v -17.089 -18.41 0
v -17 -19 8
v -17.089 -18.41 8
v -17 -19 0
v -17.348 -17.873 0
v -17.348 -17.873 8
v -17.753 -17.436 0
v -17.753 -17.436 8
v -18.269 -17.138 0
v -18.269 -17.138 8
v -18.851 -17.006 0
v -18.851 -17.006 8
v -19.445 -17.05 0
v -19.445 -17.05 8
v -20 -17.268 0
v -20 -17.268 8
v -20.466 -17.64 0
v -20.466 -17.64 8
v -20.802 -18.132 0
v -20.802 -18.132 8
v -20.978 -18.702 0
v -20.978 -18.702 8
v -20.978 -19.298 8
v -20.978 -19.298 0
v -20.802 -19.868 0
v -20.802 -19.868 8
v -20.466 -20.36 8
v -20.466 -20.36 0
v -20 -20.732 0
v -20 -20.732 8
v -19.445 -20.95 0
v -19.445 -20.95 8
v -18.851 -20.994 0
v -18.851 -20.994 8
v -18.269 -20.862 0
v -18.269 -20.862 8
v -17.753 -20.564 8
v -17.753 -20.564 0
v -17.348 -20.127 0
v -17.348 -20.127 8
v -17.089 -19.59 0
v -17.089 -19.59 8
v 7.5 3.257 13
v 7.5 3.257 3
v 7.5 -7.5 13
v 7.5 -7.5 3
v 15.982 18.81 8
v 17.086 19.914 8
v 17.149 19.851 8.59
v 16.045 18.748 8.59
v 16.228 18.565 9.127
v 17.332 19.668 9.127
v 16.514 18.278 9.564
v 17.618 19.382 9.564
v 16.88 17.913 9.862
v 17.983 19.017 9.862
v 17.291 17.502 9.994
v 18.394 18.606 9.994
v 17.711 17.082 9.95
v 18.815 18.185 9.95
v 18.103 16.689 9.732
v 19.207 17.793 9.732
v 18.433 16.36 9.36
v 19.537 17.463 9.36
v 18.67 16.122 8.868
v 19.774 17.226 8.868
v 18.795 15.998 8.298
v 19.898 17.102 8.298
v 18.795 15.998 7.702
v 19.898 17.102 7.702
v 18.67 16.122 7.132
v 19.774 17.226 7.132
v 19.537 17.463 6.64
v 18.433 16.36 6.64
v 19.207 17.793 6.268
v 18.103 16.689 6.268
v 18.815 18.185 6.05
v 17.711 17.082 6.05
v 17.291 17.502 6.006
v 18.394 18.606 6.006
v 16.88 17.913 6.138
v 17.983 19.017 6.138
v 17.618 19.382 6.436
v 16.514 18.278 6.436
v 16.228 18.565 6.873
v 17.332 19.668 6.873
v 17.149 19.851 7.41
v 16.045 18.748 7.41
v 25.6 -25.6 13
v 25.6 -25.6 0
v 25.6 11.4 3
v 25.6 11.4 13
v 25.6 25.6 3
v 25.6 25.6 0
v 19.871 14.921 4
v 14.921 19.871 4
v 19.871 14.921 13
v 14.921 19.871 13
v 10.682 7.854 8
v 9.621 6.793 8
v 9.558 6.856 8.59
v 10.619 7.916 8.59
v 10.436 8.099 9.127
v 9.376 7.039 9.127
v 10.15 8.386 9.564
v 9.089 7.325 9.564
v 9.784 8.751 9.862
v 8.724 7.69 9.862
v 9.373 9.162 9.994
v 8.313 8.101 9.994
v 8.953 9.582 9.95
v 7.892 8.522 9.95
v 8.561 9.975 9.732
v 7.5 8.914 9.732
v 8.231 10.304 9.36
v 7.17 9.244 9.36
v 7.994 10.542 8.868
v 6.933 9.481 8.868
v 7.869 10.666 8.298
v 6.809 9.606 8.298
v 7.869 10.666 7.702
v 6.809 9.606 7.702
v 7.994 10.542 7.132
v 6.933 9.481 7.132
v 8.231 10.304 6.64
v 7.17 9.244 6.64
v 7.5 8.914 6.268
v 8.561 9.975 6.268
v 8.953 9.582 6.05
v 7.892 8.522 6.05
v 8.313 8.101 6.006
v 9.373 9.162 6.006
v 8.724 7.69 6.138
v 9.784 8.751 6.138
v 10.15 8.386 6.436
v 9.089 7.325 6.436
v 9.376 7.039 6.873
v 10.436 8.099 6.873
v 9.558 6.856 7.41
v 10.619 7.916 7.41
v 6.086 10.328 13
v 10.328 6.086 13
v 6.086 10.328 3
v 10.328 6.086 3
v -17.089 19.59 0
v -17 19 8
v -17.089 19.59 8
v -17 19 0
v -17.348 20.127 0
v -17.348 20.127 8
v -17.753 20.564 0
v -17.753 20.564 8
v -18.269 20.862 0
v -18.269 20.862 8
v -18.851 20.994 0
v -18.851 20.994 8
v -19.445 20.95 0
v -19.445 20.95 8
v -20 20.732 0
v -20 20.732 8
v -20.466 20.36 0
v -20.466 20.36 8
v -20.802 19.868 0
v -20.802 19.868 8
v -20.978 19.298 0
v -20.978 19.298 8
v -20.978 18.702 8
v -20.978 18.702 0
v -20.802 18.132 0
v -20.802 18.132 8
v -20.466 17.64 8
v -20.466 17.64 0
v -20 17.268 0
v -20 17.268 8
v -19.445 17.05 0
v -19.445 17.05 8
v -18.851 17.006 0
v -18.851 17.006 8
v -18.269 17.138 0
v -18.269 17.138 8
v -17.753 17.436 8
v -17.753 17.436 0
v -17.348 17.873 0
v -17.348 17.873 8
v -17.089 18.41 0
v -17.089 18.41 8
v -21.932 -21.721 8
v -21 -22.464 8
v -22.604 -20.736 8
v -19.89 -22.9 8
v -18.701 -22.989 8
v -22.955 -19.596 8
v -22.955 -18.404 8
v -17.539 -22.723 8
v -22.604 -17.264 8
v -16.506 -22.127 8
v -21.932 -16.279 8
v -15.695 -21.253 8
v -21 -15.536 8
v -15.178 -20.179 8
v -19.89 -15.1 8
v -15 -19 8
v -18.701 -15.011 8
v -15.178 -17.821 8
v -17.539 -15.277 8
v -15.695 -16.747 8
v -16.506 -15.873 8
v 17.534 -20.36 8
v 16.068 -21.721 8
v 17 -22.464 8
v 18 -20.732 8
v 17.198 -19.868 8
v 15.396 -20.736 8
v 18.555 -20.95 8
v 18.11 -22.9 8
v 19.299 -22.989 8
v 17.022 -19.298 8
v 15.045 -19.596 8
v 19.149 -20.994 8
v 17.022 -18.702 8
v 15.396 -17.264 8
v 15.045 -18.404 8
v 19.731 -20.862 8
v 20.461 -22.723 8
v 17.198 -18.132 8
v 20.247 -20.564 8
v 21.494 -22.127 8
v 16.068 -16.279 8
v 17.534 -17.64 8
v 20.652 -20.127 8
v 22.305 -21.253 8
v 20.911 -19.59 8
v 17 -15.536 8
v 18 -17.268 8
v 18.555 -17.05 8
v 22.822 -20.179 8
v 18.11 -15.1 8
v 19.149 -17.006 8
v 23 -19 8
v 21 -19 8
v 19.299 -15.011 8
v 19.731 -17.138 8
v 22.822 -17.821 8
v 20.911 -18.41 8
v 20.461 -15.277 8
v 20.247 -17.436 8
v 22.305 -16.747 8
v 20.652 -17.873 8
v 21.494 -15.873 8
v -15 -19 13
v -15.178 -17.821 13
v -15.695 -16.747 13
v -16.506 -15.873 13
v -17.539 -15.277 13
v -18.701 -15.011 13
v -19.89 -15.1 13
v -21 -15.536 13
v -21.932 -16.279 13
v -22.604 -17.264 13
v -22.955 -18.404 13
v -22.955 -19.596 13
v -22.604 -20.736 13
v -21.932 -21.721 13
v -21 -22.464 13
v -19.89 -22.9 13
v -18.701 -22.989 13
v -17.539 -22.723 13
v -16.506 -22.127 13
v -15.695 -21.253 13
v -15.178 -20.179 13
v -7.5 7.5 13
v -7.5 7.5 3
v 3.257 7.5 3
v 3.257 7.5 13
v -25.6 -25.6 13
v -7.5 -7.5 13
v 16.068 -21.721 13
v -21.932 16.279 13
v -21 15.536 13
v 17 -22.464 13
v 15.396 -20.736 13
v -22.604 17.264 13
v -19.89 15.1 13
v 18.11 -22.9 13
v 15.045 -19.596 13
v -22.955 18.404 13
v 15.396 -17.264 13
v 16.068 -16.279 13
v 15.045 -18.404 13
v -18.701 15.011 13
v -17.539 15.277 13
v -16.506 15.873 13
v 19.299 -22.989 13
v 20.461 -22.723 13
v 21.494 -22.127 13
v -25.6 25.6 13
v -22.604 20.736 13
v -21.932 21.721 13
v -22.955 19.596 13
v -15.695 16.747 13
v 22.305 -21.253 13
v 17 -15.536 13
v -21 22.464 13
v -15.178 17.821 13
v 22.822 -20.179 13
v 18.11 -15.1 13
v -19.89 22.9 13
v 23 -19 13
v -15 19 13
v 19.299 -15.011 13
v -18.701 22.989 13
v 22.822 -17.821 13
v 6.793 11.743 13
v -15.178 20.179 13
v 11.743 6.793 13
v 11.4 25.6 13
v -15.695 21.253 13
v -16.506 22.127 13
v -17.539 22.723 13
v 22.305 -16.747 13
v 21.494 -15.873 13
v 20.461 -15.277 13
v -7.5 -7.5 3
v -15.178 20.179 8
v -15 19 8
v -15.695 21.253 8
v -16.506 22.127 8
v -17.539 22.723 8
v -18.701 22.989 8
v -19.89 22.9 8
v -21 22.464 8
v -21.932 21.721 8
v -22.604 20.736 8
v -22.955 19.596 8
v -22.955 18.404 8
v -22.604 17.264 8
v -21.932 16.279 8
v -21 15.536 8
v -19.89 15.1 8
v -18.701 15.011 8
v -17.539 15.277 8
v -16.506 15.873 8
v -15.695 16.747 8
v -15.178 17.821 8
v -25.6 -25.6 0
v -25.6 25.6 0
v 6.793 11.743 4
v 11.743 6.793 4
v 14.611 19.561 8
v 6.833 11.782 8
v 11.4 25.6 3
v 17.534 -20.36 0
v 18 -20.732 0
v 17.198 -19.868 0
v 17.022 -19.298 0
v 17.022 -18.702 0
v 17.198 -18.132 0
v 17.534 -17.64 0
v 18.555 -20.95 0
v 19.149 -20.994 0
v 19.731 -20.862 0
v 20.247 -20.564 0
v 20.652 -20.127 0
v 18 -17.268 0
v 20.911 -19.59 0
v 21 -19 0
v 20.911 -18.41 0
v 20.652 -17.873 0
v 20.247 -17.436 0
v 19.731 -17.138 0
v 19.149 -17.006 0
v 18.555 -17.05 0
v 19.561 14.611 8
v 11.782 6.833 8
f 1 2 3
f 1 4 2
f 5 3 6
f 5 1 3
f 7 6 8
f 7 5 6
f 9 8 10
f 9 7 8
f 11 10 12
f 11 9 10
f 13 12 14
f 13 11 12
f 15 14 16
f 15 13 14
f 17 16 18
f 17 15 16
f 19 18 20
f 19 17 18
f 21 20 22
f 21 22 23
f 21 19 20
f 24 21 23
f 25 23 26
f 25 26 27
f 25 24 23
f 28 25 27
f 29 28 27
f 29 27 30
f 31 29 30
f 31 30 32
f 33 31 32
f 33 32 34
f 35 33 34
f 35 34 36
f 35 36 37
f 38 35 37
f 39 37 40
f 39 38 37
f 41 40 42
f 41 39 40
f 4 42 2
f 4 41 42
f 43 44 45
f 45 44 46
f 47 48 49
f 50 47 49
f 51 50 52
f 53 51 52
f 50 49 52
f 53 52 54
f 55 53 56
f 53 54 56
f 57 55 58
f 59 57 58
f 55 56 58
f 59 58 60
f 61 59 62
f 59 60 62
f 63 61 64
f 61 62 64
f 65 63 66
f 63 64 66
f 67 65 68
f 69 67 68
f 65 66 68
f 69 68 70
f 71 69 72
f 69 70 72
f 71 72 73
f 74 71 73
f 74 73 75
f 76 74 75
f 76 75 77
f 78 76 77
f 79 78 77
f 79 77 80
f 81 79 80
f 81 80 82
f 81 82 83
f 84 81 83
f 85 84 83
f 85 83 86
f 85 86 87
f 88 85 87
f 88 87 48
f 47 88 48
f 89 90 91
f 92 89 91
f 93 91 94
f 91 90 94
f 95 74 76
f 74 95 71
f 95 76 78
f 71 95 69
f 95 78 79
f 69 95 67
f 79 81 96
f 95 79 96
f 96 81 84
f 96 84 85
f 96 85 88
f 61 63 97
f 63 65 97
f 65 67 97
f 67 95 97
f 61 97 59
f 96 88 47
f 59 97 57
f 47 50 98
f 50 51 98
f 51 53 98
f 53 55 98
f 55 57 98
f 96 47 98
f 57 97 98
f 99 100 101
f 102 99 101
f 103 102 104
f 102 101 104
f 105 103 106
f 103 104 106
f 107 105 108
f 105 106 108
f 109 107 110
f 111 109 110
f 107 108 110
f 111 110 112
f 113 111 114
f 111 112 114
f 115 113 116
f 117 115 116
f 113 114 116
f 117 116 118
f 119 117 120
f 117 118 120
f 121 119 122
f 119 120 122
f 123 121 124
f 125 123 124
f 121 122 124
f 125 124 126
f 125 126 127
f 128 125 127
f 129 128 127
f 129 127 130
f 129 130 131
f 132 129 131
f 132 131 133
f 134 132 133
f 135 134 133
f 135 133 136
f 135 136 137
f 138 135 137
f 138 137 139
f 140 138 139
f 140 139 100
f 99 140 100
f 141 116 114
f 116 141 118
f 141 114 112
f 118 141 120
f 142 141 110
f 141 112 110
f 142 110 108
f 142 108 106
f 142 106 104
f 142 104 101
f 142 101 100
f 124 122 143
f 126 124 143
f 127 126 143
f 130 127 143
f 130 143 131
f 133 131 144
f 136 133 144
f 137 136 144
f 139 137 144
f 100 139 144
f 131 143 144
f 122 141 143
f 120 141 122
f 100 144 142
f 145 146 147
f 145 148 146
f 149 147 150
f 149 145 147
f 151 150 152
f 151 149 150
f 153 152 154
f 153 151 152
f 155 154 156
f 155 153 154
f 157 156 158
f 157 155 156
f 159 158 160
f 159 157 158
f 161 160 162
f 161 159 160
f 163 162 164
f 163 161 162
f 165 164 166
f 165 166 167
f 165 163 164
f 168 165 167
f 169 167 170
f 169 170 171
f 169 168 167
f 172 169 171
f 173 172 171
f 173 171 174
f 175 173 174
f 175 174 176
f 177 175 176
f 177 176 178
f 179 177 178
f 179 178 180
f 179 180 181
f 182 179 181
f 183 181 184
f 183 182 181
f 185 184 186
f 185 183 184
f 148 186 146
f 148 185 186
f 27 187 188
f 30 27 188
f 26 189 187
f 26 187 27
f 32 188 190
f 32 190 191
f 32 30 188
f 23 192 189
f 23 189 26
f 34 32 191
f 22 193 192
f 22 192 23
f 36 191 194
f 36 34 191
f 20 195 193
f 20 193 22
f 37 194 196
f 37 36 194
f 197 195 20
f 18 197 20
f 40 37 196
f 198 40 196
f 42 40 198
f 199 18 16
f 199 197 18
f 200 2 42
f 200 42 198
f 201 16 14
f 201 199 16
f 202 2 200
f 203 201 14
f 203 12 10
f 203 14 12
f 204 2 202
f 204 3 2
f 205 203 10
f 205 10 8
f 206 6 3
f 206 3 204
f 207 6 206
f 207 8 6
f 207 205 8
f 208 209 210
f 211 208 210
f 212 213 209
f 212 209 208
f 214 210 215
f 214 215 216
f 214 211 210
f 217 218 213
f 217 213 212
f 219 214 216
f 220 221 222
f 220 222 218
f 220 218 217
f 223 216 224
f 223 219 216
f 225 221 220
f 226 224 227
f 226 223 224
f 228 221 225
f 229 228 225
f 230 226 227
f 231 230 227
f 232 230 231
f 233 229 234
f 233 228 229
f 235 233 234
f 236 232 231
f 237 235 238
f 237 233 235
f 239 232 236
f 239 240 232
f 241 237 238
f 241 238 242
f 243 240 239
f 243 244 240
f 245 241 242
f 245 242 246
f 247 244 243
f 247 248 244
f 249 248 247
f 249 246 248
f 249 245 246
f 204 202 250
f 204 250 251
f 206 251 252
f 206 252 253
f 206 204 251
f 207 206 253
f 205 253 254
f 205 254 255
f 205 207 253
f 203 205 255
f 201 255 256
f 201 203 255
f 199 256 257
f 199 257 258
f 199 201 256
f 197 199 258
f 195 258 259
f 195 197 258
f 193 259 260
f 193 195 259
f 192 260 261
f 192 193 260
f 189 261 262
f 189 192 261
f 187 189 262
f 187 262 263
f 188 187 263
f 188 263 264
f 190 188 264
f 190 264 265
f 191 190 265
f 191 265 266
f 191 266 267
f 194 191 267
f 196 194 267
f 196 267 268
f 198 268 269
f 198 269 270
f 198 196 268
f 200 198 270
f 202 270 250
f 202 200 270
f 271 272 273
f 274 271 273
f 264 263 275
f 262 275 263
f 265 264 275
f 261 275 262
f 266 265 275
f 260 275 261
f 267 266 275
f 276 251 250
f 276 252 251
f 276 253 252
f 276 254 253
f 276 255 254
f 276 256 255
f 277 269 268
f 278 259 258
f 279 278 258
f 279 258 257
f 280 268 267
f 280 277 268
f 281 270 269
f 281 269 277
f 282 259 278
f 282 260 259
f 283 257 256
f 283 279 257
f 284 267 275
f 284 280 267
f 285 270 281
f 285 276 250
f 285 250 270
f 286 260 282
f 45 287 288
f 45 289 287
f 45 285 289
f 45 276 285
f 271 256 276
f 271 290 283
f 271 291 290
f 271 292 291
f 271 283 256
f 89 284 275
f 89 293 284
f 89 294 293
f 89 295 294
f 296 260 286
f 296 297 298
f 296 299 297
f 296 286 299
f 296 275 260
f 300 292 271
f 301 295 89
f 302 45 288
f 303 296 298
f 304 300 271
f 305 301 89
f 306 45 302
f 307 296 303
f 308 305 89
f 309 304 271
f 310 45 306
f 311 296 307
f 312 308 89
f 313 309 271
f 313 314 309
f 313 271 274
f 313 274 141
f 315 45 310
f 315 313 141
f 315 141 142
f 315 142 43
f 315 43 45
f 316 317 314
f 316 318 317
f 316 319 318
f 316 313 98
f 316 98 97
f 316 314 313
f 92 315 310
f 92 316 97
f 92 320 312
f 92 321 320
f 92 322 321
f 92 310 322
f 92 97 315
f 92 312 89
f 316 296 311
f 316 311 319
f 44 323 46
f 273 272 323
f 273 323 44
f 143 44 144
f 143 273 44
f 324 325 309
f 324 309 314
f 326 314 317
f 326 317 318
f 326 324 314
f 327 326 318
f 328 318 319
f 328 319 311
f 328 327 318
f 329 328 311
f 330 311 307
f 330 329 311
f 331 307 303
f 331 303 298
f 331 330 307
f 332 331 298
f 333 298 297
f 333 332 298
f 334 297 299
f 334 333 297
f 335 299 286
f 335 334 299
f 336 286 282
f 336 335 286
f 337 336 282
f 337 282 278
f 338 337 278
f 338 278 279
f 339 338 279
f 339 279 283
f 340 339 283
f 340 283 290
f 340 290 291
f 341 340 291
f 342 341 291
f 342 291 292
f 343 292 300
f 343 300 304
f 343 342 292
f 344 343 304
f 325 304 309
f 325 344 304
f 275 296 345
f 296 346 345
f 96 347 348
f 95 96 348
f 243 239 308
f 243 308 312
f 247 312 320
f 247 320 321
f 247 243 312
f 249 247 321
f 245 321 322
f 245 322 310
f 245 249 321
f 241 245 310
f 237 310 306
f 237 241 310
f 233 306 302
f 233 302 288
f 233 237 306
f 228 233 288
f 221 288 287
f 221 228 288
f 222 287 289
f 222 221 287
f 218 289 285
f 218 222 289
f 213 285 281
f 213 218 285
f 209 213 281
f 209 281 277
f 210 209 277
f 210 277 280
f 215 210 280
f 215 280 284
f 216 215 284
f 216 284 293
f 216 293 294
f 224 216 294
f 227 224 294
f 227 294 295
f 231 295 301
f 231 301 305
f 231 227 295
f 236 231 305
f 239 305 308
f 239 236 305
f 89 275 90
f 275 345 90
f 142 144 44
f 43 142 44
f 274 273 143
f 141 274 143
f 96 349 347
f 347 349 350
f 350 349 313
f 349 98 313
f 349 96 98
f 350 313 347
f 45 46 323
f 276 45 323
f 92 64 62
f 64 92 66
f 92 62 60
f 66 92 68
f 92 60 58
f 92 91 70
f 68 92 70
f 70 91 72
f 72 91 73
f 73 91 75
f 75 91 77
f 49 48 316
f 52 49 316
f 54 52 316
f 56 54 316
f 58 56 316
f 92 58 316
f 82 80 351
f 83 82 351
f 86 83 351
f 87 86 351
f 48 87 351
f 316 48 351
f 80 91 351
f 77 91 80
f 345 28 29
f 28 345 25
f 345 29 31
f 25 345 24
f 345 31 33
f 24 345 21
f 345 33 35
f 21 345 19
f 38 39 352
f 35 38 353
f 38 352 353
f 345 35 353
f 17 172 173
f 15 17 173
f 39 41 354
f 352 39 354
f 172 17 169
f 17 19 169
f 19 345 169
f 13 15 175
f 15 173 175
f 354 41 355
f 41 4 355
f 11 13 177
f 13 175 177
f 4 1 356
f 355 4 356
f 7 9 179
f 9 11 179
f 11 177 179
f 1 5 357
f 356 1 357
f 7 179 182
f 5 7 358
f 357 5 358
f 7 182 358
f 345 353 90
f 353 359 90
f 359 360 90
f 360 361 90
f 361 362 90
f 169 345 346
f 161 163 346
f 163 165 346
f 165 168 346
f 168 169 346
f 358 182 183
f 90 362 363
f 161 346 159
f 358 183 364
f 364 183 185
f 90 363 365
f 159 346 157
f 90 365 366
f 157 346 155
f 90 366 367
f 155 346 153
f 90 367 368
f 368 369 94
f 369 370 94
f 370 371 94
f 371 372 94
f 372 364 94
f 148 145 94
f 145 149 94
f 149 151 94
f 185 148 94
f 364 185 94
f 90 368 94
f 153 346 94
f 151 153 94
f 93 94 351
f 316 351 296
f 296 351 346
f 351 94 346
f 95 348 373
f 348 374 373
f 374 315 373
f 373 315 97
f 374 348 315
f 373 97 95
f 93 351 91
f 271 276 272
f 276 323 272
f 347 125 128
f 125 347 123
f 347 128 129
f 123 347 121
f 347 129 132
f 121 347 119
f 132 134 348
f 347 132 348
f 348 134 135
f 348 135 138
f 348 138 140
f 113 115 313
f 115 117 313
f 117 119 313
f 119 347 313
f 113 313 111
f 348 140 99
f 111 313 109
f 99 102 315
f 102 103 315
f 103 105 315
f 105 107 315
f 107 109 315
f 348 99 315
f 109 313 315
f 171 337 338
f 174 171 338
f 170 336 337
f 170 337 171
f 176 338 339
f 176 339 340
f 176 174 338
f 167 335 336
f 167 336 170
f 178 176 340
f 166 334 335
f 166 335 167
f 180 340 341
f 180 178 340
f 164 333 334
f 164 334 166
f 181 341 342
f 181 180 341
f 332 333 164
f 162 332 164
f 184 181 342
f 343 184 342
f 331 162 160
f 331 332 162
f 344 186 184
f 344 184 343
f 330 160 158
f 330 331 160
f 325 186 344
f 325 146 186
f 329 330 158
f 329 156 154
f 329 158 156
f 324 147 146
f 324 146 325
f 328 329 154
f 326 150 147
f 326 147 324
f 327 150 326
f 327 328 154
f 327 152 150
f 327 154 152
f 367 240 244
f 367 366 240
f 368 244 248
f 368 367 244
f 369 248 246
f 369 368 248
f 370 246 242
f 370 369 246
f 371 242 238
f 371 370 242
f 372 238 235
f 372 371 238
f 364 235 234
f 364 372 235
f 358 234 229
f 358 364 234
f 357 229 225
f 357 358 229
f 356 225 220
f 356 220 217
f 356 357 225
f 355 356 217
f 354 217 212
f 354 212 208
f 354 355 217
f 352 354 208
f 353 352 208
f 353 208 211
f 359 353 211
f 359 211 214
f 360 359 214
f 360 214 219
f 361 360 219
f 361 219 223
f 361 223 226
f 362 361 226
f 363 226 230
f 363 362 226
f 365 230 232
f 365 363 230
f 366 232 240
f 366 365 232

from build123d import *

# Parameters (mm, degrees)
F0_W      = 51.2
F0_H      = 51.2
F0_R      = 2
F1_DEPTH  = 3
F2_R      = 2
F3_DEPTH  = 5
F4_R      = 4
F5_DEPTH  = 5
F6_R      = 2
F7_DEPTH  = 2
F8_R      = 3.5
F9_DEPTH  = 11
F10_R     = 2
F11_DEPTH = 4
F13_DEPTH = 9


with BuildPart() as f1:
    # F0 (on Top) → F1 (new body)
    with BuildSketch(Plane.XY):
        Rectangle(F0_W, F0_H)
        with Locations((-19, -19)):
            Circle(F0_R, mode=Mode.SUBTRACT)
        with Locations((19, -19)):
            Circle(F0_R, mode=Mode.SUBTRACT)
        with Locations((-19, 19)):
            Circle(F0_R, mode=Mode.SUBTRACT)
    extrude(amount=F1_DEPTH)

    # F2 (on face) → F3 (join)
    with BuildSketch(Plane.XY.offset(3)):
        Polygon((11.4, 25.6), (-25.6, 25.6), (-25.6, -25.6), (25.6, -25.6), (25.6, 11.4), align=None)
        with Locations((-19, -19)):
            Circle(F2_R, mode=Mode.SUBTRACT)
        with Locations((19, -19)):
            Circle(F2_R, mode=Mode.SUBTRACT)
        with Locations((-19, 19)):
            Circle(F2_R, mode=Mode.SUBTRACT)
        Polygon((-7.5, -7.5), (-7.5, 7.5), (3.2573593129, 7.5), (6.0857864376, 10.3284271247), (10.3284271247, 6.0857864376), (7.5, 3.2573593129), (7.5, -7.5), align=None, mode=Mode.SUBTRACT)
    extrude(amount=F3_DEPTH)

    # F4 (on face) → F5 (join)
    with BuildSketch(Plane.XY.offset(8)):
        Polygon((11.4, 25.6), (-25.6, 25.6), (-25.6, -25.6), (25.6, -25.6), (25.6, 11.4), align=None)
        with Locations((-19, -19)):
            Circle(F4_R, mode=Mode.SUBTRACT)
        with Locations((19, -19)):
            Circle(F4_R, mode=Mode.SUBTRACT)
        with Locations((-19, 19)):
            Circle(F4_R, mode=Mode.SUBTRACT)
        Polygon((-7.5, -7.5), (-7.5, 7.5), (3.2573593129, 7.5), (6.0857864376, 10.3284271247), (10.3284271247, 6.0857864376), (7.5, 3.2573593129), (7.5, -7.5), align=None, mode=Mode.SUBTRACT)
    extrude(amount=F5_DEPTH)

    # F6 (on face) → F7 (cut)
    with BuildSketch(Plane(origin=(18.5, 18.5, 0), x_dir=(-0.7071067812, 0.7071067812, 0), z_dir=(0.7071067812, 0.7071067812, 0))):
        with Locations((0, 8)):
            Circle(F6_R)
    extrude(amount=-F7_DEPTH, mode=Mode.SUBTRACT)

    # F8 (on face) → F9 (cut)
    with BuildSketch(Plane(origin=(17.0857864376, 17.0857864376, 0), x_dir=(-0.7071067812, 0.7071067812, 0), z_dir=(0.7071067812, 0.7071067812, 0))):
        with Locations((0, 8)):
            Circle(F8_R)
    extrude(amount=-F9_DEPTH, mode=Mode.SUBTRACT)

    # F10 (on face) → F11 (cut)
    with BuildSketch(Plane(origin=(8.2071067812, 8.2071067812, 0), x_dir=(0.7071067812, -0.7071067812, 0), z_dir=(-0.7071067812, -0.7071067812, 0))):
        with Locations((0, 8)):
            Circle(F10_R)
    extrude(amount=-F11_DEPTH, mode=Mode.SUBTRACT)

    # F12 (on face) → F13 (cut)
    with BuildSketch(Plane.XY.offset(13)):
        Polygon((14.9213203436, 19.8710678119), (6.7928932188, 11.7426406871), (11.7426406871, 6.7928932188), (19.8710678119, 14.9213203436), align=None)
    extrude(amount=-F13_DEPTH, mode=Mode.SUBTRACT)


solid = f1.part
